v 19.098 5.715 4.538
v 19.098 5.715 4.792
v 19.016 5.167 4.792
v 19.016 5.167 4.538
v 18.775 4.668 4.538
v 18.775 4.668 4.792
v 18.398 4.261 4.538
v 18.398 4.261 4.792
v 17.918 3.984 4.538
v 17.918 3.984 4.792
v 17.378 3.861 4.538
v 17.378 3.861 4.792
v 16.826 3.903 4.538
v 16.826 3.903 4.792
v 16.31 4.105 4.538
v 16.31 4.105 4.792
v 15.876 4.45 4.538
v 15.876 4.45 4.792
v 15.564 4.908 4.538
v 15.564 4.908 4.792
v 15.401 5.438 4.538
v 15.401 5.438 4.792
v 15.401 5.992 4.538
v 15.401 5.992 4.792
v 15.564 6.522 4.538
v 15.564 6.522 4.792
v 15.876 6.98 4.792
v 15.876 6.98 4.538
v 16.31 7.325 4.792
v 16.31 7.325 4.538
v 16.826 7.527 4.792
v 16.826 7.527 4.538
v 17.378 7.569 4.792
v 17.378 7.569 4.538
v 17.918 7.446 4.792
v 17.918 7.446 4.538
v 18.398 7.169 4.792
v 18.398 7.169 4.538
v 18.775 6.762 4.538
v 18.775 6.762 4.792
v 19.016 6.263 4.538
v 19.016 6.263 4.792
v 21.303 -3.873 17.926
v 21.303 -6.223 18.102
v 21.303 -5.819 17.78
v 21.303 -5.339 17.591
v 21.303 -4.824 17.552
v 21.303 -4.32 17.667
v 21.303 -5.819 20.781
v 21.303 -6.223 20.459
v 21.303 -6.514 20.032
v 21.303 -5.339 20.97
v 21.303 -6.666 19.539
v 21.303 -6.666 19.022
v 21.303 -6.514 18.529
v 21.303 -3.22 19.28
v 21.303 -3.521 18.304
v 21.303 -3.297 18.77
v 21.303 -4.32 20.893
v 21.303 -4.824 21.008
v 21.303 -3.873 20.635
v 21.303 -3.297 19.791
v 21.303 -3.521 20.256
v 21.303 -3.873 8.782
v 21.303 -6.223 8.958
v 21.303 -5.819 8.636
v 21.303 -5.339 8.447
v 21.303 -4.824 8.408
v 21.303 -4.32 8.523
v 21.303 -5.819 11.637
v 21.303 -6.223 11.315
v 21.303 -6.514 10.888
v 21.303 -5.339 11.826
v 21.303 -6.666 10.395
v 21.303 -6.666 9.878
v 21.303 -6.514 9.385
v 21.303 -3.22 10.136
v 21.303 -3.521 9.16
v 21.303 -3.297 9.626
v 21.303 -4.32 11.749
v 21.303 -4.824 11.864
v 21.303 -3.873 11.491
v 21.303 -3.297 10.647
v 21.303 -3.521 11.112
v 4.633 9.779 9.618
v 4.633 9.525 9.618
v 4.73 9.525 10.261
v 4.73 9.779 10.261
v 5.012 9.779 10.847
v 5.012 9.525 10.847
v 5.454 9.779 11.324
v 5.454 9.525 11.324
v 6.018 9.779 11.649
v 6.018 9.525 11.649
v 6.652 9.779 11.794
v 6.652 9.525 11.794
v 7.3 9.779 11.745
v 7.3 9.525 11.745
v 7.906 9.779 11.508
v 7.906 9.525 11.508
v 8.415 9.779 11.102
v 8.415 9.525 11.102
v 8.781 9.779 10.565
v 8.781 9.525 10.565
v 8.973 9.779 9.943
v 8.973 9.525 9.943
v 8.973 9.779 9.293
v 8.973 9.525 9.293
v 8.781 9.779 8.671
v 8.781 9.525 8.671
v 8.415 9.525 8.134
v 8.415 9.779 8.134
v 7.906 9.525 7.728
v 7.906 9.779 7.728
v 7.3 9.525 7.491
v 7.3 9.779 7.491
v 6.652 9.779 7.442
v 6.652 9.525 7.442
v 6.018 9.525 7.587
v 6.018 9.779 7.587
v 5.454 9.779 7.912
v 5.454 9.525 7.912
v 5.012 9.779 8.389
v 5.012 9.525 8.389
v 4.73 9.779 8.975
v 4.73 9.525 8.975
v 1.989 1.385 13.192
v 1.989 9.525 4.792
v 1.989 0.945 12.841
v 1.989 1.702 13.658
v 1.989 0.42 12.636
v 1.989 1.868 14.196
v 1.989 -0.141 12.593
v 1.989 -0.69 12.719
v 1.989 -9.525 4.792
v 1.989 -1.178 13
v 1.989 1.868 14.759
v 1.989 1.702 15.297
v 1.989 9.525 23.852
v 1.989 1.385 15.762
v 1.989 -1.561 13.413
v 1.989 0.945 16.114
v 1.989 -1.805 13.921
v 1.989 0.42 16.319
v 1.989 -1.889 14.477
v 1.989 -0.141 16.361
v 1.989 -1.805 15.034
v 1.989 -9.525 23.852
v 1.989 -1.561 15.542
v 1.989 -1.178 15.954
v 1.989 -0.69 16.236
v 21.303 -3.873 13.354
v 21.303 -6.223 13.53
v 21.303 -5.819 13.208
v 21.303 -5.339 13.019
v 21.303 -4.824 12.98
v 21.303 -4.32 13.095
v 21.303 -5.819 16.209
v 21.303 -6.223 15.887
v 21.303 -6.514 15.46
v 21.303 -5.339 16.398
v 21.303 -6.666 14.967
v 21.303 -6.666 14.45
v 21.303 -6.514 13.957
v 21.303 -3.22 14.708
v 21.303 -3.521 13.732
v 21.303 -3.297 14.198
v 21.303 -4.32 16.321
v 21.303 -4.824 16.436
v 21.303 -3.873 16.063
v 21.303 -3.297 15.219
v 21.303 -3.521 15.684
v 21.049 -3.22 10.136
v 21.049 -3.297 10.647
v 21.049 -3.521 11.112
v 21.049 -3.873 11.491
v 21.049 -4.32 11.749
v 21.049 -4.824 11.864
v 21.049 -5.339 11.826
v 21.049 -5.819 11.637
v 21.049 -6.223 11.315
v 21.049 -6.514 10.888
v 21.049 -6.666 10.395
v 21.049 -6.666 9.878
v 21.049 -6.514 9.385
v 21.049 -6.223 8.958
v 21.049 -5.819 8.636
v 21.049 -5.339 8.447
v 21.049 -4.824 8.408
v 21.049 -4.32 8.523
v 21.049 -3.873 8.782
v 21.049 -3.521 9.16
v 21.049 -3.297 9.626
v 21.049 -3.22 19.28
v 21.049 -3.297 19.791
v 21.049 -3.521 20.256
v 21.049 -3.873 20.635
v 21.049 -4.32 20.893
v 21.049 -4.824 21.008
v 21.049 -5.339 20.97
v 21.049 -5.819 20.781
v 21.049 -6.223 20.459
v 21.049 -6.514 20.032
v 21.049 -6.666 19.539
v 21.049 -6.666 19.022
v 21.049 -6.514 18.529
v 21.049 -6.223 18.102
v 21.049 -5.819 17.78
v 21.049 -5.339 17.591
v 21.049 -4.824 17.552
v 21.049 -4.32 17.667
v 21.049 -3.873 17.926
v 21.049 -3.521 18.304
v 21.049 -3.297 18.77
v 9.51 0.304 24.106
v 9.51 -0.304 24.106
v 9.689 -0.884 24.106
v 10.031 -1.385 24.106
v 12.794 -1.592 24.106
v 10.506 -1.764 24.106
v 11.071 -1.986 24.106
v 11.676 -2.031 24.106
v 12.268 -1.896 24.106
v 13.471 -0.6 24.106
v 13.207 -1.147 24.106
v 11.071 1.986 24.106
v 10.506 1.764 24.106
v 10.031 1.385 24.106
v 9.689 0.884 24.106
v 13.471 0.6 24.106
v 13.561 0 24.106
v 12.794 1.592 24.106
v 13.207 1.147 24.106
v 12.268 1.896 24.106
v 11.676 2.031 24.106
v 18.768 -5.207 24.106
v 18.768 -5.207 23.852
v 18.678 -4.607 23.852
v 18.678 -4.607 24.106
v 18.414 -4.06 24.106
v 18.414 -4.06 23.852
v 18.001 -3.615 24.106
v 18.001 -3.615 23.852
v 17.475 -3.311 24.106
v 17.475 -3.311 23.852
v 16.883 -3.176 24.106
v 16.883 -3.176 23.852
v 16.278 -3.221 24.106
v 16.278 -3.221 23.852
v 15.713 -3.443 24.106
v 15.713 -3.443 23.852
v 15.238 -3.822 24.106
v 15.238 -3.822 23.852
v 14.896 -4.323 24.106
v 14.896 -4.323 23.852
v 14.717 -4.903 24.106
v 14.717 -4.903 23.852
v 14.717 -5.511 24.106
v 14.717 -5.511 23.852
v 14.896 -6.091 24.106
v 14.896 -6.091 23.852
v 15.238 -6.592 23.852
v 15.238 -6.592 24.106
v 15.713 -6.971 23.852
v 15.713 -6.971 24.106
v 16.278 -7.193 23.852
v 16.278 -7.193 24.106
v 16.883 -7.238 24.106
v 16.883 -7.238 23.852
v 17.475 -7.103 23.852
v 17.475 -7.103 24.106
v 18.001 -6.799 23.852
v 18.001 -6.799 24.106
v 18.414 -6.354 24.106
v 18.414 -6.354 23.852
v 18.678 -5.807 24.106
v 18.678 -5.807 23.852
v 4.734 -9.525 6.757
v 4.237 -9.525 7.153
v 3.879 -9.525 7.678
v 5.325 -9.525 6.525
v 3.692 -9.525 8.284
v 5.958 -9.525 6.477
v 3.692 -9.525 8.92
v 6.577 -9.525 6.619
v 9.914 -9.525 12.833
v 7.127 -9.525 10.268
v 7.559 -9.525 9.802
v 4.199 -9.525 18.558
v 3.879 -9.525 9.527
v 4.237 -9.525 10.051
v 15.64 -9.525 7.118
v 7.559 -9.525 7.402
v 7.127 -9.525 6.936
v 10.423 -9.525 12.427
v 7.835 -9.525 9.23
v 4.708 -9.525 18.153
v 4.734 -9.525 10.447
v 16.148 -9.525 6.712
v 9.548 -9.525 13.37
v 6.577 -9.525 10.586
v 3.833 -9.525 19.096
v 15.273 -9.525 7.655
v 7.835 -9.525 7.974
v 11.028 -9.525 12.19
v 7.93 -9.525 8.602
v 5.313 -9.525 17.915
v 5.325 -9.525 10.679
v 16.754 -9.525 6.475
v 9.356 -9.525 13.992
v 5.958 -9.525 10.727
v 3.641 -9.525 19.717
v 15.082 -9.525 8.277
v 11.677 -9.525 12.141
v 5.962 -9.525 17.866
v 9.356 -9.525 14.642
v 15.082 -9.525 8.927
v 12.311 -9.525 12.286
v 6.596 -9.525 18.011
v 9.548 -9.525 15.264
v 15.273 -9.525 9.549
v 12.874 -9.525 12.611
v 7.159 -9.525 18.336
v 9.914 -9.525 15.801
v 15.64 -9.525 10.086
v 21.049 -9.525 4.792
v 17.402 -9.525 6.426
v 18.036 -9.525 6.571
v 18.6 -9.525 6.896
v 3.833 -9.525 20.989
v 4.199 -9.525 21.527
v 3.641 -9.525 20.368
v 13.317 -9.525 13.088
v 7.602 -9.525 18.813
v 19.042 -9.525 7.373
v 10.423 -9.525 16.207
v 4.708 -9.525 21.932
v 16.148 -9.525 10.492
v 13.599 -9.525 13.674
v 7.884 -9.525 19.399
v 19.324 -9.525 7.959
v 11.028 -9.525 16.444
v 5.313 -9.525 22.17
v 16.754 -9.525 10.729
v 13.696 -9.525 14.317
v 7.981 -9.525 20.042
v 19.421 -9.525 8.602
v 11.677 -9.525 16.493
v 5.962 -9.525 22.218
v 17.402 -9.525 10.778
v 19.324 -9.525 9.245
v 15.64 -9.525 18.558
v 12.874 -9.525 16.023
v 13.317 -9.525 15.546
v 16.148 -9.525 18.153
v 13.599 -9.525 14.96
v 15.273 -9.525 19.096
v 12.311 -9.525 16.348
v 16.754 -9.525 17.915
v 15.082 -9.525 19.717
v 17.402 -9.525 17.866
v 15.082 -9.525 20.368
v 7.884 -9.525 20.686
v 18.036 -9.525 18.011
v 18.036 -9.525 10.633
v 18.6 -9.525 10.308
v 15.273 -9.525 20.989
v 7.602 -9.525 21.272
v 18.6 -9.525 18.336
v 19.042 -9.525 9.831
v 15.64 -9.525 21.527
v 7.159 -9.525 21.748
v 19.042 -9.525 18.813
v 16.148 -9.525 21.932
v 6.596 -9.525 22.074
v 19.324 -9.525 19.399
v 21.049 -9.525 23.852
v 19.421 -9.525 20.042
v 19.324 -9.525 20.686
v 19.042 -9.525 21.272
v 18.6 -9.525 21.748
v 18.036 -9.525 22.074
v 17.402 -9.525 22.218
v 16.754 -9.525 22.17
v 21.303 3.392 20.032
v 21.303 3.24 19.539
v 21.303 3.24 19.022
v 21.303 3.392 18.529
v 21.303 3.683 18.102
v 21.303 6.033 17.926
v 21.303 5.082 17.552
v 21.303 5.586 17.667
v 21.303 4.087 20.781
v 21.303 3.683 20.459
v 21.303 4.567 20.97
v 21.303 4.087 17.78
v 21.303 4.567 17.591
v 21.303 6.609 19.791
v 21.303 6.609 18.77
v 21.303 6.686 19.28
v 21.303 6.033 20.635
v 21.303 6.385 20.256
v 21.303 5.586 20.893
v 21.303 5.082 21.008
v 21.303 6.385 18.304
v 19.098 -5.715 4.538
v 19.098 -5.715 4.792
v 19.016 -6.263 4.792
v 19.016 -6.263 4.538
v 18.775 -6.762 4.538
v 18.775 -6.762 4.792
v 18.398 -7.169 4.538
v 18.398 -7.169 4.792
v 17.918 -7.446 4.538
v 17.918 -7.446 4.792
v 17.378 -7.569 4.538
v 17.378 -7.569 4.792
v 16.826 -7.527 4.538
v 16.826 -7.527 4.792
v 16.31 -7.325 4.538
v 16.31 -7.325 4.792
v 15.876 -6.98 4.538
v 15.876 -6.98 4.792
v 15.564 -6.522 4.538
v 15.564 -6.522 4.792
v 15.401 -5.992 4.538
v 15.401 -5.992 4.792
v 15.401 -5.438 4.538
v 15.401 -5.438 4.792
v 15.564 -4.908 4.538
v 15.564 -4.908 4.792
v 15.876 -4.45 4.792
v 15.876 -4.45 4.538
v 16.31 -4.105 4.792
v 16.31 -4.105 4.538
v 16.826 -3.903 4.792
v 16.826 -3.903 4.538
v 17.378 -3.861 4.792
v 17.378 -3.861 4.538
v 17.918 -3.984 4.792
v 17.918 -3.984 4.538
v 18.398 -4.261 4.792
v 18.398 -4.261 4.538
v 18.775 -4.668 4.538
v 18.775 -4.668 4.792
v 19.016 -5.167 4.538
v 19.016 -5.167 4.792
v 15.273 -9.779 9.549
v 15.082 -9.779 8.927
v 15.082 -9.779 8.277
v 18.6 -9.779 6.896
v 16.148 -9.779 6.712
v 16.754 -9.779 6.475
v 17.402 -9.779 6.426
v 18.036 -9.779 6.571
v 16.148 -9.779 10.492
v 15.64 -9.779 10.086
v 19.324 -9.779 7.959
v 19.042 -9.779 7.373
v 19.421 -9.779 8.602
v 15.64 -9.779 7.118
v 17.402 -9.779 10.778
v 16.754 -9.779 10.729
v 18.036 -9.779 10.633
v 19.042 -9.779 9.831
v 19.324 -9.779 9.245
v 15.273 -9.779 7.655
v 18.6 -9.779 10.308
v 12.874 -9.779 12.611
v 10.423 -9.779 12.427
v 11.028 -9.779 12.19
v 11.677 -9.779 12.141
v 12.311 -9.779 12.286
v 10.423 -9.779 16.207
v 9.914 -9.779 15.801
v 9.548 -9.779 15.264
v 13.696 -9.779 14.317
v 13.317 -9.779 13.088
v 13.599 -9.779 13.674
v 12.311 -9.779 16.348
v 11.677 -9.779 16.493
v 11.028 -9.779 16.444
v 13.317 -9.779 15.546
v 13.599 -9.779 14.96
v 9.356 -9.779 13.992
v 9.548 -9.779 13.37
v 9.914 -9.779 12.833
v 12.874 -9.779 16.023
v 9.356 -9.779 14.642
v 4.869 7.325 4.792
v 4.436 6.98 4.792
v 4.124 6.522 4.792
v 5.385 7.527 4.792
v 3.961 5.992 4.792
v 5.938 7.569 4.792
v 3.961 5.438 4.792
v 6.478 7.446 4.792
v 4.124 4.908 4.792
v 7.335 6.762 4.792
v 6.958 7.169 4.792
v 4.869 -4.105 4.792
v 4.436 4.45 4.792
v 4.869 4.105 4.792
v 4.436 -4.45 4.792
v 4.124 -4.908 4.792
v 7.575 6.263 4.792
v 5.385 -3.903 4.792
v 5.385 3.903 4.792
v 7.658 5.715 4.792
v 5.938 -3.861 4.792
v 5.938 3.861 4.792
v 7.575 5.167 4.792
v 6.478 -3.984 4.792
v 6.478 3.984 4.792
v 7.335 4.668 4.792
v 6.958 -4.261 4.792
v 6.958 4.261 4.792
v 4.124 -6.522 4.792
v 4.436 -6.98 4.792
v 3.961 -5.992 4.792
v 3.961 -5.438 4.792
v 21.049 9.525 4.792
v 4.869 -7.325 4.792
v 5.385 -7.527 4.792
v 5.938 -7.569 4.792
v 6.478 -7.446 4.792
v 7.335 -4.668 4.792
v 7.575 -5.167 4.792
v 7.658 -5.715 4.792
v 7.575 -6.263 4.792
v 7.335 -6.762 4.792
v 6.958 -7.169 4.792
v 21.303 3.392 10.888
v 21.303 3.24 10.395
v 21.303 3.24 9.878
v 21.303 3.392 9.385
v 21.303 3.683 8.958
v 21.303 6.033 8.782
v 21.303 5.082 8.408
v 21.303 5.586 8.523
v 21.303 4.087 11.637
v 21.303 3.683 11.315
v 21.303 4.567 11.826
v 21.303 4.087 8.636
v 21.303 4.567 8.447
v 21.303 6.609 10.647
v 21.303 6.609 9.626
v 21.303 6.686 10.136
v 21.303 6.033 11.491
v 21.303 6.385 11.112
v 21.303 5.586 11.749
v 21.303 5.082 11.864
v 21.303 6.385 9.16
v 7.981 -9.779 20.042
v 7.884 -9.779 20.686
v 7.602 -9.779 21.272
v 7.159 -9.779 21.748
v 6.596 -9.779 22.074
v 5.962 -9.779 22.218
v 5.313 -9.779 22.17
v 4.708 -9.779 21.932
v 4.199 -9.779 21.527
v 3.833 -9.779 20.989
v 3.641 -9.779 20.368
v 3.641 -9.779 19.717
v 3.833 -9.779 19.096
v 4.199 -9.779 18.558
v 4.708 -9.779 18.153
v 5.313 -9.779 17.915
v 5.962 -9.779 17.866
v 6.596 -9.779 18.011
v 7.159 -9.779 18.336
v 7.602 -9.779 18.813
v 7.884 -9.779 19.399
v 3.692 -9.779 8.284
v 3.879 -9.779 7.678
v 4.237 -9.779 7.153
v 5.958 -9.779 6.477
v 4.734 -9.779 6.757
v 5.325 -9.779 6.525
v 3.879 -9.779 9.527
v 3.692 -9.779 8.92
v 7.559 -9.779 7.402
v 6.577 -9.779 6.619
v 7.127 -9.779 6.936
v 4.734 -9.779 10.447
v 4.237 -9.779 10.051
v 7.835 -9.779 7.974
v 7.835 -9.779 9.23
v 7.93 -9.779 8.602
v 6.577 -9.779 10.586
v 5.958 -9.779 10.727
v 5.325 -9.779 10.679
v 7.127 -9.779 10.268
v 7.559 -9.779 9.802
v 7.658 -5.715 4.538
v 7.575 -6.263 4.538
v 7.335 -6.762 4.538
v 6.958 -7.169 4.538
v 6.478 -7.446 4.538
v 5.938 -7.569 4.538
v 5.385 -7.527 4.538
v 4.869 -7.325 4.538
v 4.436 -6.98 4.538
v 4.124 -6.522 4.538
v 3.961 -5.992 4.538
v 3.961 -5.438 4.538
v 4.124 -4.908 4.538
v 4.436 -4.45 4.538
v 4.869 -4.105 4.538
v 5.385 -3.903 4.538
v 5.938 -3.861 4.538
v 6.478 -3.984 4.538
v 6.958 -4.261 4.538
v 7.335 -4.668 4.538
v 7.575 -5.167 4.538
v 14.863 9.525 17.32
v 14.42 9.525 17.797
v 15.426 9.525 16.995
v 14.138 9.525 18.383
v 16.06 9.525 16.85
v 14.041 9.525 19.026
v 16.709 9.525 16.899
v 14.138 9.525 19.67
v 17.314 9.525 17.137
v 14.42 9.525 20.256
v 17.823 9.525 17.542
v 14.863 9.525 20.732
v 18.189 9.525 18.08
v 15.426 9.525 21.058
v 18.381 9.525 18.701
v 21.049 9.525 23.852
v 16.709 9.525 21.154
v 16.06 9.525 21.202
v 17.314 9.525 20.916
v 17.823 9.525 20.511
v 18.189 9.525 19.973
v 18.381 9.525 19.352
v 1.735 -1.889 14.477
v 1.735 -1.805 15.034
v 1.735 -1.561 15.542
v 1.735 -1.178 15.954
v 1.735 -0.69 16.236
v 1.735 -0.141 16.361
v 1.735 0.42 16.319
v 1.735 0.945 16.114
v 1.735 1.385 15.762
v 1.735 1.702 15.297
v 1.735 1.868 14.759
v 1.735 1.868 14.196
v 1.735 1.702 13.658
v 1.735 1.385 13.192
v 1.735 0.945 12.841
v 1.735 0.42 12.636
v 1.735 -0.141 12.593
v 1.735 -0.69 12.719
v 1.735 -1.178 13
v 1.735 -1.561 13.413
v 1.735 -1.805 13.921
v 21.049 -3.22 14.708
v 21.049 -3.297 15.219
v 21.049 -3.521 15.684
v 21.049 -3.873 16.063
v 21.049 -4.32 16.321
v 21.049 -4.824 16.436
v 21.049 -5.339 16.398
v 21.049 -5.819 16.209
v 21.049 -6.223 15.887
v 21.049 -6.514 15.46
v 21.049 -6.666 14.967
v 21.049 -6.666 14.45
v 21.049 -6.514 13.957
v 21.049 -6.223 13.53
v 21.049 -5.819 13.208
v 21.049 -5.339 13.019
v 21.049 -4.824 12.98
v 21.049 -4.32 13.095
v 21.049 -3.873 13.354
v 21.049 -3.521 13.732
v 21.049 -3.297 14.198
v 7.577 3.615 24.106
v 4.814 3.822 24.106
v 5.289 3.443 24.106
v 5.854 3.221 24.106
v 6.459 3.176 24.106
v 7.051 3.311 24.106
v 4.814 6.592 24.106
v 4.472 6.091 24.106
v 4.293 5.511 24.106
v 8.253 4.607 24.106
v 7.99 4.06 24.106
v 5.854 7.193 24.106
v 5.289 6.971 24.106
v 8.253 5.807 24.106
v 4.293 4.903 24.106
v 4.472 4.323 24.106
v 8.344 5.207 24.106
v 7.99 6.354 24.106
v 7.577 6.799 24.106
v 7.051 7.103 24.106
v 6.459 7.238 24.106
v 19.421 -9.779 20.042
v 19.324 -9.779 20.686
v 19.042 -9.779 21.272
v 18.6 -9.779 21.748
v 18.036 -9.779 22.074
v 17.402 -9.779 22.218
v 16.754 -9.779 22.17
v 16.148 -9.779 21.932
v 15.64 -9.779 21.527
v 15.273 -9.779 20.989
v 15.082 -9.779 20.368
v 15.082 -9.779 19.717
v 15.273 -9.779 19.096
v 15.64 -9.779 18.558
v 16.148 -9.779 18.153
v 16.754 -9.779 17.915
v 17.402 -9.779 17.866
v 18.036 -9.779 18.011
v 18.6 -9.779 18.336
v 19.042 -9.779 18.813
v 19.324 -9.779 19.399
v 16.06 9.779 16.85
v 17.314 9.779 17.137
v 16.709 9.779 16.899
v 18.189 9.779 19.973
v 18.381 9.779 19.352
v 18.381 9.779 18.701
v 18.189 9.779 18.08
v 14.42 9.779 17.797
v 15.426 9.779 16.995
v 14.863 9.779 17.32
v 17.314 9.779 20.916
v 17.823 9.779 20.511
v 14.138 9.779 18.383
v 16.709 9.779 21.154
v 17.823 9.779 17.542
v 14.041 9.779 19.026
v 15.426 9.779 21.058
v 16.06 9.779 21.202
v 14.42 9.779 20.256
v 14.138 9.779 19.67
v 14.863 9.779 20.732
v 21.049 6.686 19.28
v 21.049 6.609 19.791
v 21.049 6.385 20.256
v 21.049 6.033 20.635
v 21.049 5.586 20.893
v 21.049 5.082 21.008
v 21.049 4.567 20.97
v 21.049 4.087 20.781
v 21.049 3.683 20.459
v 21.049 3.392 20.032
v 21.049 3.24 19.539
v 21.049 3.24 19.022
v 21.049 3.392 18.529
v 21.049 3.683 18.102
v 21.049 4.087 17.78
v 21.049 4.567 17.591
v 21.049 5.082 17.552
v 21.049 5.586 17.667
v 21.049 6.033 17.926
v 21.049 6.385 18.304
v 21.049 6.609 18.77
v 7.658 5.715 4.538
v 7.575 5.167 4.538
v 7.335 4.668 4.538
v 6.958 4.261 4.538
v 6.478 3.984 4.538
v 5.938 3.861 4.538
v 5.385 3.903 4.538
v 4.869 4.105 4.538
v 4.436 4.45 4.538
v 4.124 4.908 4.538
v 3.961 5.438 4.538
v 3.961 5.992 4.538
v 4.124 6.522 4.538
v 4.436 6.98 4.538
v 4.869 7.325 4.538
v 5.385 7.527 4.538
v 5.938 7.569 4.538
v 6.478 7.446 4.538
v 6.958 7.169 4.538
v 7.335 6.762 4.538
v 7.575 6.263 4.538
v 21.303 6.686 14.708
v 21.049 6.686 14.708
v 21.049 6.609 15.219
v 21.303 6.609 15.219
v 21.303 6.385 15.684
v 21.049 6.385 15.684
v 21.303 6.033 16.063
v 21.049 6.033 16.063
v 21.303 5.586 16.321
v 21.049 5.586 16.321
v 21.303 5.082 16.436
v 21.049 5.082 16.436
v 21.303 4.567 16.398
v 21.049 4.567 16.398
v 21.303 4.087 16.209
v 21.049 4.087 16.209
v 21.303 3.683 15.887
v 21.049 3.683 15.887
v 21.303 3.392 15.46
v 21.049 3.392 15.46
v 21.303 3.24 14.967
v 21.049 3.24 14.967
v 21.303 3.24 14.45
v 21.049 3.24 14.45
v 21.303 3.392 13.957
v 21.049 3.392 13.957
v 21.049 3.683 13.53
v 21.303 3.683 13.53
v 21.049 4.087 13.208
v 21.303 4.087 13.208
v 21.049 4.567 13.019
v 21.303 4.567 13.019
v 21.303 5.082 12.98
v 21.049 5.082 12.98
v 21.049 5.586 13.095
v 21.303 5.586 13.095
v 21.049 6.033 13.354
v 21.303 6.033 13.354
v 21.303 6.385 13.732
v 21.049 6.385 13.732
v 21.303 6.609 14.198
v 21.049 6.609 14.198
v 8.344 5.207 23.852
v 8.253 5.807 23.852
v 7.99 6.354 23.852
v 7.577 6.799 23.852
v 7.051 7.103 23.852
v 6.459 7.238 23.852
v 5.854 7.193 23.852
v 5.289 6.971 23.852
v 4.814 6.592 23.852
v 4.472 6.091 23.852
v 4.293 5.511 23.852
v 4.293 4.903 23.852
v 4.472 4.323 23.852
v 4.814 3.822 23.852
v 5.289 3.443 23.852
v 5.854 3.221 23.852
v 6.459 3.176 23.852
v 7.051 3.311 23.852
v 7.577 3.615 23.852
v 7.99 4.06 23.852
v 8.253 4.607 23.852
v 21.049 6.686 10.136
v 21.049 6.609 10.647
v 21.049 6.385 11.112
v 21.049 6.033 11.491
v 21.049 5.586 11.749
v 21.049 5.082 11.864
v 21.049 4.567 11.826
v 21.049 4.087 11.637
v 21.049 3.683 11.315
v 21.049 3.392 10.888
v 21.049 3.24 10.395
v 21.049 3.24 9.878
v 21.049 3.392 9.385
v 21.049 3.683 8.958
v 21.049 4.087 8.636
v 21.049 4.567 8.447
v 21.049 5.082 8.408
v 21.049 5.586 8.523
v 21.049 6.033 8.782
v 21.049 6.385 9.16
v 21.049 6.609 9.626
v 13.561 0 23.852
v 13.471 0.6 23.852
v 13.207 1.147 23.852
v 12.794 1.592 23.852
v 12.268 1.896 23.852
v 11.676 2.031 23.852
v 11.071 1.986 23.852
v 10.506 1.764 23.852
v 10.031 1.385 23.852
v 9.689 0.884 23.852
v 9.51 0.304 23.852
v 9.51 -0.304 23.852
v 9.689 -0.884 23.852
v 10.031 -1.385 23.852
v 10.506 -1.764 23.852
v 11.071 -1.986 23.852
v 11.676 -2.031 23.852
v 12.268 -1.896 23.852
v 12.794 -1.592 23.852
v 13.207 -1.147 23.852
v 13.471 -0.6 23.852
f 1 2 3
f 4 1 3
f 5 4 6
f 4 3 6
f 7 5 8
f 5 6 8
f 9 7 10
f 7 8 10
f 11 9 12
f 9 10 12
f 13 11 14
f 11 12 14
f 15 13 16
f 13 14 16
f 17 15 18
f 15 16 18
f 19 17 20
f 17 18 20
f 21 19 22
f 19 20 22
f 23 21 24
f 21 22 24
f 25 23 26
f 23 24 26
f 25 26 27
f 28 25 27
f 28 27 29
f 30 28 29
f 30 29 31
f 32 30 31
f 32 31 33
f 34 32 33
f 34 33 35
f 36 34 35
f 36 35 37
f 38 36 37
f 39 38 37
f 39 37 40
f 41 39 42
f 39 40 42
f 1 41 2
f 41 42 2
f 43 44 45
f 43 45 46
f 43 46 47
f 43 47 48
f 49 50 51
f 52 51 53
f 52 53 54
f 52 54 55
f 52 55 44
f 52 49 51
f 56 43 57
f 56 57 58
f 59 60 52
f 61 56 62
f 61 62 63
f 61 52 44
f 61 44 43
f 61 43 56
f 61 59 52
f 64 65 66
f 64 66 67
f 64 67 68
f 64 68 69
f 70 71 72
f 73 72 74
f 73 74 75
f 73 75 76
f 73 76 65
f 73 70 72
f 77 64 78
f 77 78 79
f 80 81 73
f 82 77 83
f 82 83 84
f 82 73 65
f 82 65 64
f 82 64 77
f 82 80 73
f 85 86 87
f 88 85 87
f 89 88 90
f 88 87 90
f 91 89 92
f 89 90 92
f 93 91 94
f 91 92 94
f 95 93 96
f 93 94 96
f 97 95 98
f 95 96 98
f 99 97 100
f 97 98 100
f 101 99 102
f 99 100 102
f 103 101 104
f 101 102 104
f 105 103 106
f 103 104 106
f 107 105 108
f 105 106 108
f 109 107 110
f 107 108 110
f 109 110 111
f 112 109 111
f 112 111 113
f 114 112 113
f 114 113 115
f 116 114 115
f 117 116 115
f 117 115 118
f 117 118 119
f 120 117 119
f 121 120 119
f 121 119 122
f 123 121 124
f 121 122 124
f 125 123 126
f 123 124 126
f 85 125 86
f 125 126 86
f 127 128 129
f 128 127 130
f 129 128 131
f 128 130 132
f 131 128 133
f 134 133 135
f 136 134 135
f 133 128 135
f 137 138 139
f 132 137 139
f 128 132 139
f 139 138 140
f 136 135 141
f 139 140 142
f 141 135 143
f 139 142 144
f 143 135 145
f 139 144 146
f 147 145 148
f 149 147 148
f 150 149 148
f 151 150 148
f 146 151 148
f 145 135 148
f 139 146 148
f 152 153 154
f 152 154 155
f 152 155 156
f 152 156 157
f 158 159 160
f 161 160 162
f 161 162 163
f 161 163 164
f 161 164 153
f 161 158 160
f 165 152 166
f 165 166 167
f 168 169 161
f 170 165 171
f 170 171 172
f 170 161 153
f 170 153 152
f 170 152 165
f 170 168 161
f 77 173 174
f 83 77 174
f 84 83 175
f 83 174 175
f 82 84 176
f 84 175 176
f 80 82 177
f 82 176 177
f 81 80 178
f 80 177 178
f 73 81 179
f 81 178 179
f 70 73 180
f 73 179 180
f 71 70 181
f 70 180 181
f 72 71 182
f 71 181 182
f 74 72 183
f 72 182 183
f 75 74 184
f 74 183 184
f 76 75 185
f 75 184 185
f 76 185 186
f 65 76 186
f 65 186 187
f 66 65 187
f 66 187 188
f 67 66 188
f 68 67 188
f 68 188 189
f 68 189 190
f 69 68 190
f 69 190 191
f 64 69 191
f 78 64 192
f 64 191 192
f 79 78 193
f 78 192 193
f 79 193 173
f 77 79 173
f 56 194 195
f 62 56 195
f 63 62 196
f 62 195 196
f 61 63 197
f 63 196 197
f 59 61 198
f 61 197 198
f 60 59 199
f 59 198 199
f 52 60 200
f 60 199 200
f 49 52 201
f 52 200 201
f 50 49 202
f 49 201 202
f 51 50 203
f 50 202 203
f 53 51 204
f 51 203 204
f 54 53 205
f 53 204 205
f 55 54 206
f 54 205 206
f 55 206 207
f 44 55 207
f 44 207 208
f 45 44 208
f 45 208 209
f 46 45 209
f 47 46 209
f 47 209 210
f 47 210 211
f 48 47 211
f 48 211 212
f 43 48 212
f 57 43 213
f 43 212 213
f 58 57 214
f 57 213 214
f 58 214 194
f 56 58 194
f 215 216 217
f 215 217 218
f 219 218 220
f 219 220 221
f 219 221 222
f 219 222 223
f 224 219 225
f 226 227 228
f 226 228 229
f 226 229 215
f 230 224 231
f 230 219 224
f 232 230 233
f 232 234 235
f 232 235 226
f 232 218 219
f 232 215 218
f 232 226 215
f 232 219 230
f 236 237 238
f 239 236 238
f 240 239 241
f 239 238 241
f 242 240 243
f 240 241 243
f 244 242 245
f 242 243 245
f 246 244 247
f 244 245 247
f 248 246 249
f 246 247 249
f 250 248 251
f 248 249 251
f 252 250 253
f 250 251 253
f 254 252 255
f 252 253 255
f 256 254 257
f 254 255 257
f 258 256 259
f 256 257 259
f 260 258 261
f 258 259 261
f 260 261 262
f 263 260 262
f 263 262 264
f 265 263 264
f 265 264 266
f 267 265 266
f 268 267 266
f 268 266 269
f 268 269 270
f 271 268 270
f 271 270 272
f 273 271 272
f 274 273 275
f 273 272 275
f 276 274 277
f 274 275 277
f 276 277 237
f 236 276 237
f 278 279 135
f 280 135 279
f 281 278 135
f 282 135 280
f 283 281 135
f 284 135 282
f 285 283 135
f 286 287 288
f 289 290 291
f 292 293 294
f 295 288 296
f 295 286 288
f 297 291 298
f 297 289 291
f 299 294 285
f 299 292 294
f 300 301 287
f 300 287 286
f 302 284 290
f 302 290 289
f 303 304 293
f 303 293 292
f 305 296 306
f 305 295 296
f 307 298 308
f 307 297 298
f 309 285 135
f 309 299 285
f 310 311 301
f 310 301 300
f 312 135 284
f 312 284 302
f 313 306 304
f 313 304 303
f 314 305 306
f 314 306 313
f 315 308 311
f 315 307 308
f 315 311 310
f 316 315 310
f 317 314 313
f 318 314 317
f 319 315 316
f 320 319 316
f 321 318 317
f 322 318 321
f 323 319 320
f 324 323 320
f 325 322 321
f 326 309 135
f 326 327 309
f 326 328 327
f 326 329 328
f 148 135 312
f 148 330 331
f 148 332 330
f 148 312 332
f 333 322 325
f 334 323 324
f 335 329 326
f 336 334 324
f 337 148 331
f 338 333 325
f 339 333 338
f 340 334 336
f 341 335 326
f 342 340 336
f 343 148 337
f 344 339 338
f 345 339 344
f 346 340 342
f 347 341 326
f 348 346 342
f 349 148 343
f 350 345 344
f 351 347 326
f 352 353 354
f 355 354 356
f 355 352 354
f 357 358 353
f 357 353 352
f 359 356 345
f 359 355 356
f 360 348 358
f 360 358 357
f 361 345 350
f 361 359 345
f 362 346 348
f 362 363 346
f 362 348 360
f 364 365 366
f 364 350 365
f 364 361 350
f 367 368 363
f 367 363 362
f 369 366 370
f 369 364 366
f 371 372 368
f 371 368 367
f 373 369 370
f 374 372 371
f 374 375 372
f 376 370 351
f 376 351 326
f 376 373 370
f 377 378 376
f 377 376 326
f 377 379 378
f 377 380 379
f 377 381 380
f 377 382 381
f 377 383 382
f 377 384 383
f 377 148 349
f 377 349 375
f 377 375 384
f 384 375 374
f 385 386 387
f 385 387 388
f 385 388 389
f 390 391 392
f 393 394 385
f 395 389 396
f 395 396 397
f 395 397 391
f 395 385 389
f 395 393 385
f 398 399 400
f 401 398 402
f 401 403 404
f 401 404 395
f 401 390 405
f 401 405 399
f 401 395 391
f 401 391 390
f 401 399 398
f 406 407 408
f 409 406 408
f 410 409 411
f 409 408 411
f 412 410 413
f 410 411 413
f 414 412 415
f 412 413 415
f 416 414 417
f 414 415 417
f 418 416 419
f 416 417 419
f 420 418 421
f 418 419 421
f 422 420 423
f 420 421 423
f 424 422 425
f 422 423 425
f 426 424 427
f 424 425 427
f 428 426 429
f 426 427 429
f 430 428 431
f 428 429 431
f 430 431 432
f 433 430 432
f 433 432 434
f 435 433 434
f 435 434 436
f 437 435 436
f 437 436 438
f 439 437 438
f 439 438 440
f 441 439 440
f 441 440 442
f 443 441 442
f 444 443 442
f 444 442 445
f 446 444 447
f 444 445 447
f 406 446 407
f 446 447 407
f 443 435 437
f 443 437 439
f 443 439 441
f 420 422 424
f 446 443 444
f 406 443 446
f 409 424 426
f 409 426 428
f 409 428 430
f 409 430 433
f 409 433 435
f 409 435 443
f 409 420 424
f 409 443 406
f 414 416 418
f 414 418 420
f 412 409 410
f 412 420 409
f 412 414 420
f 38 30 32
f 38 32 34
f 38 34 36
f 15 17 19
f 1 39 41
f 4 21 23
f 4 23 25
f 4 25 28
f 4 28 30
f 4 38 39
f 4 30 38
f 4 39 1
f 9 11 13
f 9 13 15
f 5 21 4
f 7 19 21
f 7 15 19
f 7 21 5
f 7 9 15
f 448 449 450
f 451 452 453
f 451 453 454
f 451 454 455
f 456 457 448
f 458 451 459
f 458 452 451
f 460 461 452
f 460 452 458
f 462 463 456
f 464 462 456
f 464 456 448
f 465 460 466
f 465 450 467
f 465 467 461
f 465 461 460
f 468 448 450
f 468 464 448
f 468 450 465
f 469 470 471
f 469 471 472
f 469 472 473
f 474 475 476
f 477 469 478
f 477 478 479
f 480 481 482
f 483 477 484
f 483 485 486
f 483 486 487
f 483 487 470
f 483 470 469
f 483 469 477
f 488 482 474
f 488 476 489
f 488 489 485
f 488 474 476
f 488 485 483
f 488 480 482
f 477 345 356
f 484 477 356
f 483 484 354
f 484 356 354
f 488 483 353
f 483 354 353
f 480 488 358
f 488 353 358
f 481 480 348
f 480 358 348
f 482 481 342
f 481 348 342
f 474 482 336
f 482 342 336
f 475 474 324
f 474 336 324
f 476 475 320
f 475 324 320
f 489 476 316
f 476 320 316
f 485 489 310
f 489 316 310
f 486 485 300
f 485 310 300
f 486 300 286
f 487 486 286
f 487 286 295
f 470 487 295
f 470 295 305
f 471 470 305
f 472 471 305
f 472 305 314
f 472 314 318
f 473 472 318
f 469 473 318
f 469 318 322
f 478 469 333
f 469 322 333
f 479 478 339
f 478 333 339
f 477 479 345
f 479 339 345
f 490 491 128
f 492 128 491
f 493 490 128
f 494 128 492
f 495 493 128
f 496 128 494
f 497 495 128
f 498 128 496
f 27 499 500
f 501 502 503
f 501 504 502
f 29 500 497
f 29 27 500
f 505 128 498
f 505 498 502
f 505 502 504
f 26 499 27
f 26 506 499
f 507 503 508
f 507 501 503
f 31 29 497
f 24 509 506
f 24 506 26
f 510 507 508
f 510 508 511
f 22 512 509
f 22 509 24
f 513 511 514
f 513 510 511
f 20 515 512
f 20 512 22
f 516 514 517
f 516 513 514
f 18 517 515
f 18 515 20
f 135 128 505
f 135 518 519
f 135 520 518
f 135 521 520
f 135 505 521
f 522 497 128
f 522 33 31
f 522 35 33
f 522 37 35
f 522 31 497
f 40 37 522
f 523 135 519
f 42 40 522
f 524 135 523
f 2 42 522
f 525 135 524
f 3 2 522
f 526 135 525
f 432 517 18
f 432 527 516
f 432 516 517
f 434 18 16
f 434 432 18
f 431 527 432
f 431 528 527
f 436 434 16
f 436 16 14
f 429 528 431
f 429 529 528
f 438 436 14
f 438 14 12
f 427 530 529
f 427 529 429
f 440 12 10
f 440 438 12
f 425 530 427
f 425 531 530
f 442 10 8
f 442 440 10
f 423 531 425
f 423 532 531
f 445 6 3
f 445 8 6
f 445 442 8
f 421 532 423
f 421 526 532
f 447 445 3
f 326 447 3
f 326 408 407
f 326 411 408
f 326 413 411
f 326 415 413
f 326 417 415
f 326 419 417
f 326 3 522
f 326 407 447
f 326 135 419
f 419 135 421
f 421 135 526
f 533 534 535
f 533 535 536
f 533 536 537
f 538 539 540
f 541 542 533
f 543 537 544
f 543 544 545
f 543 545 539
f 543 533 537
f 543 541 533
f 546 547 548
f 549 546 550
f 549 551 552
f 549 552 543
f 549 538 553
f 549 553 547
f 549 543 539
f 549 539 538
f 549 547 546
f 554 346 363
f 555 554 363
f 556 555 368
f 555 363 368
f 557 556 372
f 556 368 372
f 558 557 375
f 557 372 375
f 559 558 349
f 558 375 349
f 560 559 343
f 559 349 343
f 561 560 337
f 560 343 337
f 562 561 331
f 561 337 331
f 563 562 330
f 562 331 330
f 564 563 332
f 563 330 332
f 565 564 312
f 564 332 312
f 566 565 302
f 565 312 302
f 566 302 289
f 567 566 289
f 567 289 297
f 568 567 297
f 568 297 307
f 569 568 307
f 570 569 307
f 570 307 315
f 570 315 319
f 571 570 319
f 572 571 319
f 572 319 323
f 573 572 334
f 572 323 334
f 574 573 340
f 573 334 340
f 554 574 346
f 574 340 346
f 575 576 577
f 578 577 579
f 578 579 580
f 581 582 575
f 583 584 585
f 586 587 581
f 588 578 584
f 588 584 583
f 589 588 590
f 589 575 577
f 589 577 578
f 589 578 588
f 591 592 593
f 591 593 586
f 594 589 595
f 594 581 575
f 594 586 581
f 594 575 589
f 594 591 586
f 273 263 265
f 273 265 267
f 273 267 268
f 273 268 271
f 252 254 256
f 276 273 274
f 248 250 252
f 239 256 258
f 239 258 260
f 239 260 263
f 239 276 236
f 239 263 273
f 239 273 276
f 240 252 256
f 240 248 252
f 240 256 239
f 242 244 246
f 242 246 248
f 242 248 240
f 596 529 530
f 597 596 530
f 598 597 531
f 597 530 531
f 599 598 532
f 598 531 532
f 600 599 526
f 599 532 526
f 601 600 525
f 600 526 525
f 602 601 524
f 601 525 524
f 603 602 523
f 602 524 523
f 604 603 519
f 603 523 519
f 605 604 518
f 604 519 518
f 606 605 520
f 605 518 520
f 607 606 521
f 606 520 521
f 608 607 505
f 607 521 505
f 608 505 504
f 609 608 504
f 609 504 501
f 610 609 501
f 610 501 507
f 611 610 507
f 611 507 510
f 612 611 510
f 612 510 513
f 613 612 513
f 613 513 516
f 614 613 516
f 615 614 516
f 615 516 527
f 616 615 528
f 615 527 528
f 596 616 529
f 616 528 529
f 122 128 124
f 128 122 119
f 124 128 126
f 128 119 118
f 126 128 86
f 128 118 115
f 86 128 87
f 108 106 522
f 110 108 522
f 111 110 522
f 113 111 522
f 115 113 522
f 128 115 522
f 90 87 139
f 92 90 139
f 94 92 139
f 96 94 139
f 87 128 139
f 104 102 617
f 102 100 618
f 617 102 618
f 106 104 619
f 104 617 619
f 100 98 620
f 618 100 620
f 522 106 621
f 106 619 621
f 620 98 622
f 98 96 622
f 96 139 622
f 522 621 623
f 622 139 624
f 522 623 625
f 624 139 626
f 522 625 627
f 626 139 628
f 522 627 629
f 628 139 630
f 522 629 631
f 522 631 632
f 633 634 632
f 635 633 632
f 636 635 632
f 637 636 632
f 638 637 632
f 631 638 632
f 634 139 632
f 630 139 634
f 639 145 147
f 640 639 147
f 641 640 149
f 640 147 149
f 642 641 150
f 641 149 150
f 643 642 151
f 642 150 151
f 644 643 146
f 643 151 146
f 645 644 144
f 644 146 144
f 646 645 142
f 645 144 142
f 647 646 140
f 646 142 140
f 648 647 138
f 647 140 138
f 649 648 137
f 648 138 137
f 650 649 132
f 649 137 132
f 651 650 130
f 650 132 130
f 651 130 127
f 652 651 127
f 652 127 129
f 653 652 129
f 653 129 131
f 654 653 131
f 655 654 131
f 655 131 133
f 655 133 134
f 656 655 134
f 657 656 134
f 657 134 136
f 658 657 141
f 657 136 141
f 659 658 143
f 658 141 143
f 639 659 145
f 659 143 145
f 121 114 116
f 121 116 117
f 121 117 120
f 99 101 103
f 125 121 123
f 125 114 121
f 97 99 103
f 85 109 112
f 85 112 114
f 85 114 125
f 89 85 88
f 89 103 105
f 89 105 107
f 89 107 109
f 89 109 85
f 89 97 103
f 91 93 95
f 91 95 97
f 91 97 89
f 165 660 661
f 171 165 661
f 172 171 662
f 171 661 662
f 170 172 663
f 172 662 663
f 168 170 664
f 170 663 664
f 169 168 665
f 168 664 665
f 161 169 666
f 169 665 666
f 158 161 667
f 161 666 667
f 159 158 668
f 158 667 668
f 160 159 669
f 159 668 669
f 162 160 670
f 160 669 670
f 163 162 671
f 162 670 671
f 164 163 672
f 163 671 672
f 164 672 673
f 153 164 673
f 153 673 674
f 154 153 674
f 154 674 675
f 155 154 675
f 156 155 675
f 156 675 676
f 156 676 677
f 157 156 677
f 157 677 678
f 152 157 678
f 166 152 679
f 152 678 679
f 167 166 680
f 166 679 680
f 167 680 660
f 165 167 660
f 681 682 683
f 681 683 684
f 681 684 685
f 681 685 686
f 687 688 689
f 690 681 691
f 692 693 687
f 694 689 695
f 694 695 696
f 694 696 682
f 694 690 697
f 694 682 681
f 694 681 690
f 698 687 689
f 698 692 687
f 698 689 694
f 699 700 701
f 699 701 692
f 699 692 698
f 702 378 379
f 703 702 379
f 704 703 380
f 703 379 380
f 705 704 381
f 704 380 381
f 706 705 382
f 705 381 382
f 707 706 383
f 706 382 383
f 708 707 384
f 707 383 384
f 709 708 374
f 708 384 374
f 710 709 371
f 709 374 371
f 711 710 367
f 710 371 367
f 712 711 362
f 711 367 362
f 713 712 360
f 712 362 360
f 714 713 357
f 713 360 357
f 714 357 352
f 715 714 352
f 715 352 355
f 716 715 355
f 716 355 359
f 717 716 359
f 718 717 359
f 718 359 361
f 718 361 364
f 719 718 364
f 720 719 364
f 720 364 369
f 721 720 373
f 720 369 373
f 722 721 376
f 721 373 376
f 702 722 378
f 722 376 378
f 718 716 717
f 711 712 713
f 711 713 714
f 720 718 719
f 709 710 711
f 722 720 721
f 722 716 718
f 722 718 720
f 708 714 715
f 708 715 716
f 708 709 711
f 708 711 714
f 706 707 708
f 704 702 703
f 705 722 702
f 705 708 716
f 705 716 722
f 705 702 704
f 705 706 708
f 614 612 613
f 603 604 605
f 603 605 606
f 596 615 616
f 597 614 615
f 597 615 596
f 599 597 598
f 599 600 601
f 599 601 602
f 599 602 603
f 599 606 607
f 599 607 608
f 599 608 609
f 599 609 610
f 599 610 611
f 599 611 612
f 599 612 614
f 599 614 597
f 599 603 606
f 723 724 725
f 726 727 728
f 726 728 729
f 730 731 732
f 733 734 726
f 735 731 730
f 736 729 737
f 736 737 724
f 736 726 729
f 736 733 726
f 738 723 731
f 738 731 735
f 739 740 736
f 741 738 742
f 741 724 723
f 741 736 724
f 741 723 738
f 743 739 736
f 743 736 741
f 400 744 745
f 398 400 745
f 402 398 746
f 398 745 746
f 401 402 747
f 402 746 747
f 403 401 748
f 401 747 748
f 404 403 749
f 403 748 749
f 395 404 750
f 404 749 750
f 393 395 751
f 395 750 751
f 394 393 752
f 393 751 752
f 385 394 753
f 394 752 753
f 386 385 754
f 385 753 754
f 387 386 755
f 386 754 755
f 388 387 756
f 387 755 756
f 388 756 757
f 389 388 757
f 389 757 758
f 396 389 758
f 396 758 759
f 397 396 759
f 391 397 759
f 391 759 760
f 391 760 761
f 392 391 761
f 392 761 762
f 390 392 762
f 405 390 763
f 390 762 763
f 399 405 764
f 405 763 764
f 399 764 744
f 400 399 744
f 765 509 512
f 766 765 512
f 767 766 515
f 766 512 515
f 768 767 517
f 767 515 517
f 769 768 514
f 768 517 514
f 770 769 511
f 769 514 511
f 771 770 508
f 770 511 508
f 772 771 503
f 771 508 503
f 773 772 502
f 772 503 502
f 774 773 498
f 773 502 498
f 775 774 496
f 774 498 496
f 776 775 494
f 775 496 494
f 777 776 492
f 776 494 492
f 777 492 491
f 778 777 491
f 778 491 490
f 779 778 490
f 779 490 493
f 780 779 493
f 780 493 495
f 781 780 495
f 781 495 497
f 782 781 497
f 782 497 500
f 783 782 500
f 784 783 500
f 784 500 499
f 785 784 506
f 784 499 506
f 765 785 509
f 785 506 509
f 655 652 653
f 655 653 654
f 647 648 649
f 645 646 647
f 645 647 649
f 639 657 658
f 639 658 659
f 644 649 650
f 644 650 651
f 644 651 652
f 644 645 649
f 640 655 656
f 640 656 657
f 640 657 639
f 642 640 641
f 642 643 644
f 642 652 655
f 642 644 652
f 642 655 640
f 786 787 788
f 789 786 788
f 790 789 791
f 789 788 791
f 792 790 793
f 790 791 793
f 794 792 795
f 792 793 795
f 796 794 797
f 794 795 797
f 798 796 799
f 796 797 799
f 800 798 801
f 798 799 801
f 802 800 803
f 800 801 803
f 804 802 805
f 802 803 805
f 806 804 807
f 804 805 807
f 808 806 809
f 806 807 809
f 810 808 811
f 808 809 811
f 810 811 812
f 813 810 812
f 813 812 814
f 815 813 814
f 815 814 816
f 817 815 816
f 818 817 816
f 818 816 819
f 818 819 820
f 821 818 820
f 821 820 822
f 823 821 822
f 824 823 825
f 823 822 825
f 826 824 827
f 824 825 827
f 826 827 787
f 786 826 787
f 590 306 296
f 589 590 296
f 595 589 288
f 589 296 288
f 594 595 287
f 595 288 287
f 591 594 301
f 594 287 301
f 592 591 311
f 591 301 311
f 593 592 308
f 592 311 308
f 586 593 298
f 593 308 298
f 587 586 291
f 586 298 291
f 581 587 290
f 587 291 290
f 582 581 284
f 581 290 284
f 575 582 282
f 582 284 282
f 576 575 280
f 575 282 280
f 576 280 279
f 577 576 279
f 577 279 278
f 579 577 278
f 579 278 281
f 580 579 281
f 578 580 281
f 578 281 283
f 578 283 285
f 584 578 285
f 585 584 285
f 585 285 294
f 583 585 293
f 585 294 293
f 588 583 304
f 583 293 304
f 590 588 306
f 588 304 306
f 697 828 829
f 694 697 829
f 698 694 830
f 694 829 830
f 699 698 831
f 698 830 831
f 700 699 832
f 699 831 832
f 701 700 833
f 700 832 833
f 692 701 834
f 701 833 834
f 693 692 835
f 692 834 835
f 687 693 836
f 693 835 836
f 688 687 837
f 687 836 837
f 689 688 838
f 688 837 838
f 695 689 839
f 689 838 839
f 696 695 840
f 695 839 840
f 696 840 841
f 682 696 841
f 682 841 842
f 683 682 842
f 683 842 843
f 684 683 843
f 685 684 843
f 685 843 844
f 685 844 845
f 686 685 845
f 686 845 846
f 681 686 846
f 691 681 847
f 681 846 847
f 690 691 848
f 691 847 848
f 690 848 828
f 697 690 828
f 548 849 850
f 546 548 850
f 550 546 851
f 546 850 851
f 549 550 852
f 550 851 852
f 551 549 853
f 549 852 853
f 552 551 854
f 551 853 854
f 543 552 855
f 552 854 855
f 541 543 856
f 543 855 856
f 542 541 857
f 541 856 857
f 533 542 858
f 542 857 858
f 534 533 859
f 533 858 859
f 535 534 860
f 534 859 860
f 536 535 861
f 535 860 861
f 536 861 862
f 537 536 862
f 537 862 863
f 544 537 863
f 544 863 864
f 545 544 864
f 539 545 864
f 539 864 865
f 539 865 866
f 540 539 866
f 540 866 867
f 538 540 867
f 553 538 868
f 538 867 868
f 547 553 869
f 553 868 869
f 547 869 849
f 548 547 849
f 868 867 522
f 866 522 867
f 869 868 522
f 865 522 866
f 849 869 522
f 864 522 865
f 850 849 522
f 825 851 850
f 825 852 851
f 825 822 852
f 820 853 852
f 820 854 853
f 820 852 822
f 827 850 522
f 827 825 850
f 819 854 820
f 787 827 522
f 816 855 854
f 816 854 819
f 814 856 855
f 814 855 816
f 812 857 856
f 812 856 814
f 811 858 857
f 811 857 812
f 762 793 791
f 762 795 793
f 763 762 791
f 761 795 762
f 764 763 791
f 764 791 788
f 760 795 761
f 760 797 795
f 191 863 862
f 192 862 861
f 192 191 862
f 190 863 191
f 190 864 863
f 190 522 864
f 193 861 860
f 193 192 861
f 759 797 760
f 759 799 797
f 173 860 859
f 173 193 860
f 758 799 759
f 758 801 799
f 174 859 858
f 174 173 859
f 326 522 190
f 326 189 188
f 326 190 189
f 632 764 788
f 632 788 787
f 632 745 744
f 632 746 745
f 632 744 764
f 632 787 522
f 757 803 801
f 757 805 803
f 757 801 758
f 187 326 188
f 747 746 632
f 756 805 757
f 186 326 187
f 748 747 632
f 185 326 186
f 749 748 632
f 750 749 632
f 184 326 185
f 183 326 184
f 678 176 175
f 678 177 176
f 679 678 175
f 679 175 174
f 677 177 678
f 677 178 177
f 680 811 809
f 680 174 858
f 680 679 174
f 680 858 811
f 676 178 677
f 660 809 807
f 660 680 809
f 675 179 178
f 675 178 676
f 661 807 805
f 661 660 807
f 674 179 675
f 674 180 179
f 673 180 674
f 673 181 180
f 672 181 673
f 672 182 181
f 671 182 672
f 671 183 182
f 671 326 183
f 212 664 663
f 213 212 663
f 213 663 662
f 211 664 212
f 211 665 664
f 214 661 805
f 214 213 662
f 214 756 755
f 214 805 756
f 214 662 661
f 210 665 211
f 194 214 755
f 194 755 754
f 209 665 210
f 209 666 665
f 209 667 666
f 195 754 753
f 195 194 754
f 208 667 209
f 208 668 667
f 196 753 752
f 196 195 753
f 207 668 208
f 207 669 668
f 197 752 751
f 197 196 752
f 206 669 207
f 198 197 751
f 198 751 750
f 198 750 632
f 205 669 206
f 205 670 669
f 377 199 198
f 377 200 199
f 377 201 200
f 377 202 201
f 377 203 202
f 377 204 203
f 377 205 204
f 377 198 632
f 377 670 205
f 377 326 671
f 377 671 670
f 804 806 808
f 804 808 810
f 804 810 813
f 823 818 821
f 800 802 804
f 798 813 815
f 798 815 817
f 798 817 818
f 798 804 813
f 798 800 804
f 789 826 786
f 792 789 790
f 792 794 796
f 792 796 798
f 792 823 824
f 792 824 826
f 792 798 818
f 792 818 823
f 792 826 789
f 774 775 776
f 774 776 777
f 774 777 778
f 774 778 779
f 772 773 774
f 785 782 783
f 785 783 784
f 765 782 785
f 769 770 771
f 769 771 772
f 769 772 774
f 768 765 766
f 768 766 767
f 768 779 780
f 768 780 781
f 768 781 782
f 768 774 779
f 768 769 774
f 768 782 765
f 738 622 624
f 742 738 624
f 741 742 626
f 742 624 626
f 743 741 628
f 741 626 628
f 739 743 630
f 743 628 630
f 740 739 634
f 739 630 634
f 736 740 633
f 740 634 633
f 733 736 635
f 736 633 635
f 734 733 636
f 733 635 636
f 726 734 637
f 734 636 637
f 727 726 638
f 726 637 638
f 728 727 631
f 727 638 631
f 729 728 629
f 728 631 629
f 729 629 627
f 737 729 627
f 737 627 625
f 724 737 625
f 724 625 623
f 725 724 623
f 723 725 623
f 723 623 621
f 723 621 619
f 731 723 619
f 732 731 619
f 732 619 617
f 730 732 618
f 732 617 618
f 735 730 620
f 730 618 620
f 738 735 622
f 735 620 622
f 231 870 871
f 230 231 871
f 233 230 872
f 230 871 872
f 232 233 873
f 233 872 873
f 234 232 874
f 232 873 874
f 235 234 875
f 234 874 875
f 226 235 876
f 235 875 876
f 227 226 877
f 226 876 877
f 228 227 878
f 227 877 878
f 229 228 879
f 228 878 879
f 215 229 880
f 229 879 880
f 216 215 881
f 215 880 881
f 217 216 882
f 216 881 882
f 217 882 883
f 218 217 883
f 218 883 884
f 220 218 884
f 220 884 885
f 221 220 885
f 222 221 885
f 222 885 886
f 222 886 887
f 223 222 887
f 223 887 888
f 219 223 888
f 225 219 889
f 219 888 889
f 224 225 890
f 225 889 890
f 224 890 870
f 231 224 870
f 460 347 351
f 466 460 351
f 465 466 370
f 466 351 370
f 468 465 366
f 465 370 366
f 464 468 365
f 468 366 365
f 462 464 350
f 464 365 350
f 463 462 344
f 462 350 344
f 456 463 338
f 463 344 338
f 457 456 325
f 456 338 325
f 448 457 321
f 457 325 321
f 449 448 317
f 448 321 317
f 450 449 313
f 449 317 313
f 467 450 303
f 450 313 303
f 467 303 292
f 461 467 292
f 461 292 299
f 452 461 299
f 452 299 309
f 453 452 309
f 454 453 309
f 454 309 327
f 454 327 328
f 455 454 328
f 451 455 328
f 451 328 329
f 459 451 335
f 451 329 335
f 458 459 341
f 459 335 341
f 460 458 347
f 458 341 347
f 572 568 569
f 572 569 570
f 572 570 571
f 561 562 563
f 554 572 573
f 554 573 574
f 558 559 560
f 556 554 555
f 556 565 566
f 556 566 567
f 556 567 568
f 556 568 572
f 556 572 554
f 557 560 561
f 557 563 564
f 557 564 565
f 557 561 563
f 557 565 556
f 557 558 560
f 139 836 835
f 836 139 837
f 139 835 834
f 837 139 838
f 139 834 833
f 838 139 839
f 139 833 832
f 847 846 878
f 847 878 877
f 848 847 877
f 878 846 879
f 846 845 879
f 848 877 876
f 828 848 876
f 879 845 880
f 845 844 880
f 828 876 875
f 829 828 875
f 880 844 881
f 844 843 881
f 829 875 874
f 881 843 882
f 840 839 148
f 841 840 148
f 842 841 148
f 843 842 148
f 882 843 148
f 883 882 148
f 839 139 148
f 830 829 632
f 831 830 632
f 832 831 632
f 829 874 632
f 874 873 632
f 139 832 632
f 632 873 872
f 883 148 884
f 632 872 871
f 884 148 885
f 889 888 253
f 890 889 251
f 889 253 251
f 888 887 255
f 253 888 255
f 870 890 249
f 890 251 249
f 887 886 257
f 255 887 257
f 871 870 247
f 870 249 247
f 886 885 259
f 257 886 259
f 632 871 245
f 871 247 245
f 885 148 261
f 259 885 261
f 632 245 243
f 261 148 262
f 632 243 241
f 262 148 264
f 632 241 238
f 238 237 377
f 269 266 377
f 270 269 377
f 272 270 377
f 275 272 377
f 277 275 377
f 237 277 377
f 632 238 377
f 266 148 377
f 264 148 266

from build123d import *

# Parameters (mm, degrees)
F0_W      = 19.06034071
F0_H      = 19.06034071
F1_DEPTH  = 9.525
F2_R      = 1.8892312699
F8_DEPTH  = 0.254
F3_R      = 1.7327827713
F9_DEPTH  = 0.254
F4_R      = 2.1821211745
F10_DEPTH = 0.254
F5_R      = 2.0368058648
F11_DEPTH = 0.254
F6_R      = 1.8590976902
F12_DEPTH = 0.254
F7_R      = 2.1308019233
F7_R_2    = 2.1821211745
F13_DEPTH = 0.254


with BuildPart() as f1:
    # F0 (on Front) → F1 (new body, symmetric)
    with BuildSketch(Plane.XZ):
        with Locations((11.5190818906, 14.3221947365)):
            Rectangle(F0_W, F0_H)
    extrude(amount=F1_DEPTH, both=True)

    # F2 (on face) → F8 (join)
    with BuildSketch(Plane(origin=(1.9889115356, 0, 0), x_dir=(0, -1, 0), z_dir=(-1, 0, 0))):
        with Locations((0, 14.4774196669)):
            Circle(F2_R)
    extrude(amount=F8_DEPTH)

    # F3 (on face) → F9 (join)
    with BuildSketch(Plane.YZ.offset(21.0492522456)):
        with Locations((-4.953, 19.2803650914)):
            Circle(F3_R)
        with Locations((4.953, 19.2803650914)):
            Circle(F3_R)
        with Locations((4.953, 10.1363650914)):
            Circle(F3_R)
        with Locations((-4.953, 10.1363650914)):
            Circle(F3_R)
        with Locations((-4.953, 14.7083650914)):
            Circle(F3_R)
        with Locations((4.953, 14.7083650914)):
            Circle(F3_R)
    extrude(amount=F9_DEPTH)

    # F4 (on face) → F10 (join)
    with BuildSketch(Plane(origin=(0, 9.525, 0), x_dir=(-1, 0, 0), z_dir=(0, 1, 0))):
        with Locations((-16.2232522456, 19.0263650914)):
            Circle(F4_R)
        with Locations((-6.8149115356, 9.6180243815)):
            Circle(F4_R)
    extrude(amount=F10_DEPTH)

    # F5 (on face) → F11 (join)
    with BuildSketch(Plane.XY.offset(23.8523650914)):
        with Locations((16.7312522456, -5.207)):
            Circle(F5_R)
        with Locations((11.5242522456, 0)):
            Circle(F5_R)
        with Locations((6.3069115356, 5.207)):
            Circle(F5_R)
    extrude(amount=F11_DEPTH)

    # F6 (on face) → F12 (join)
    with BuildSketch(Plane(origin=(0, 0, 4.7920243815), x_dir=(1, 0, 0), z_dir=(0, 0, -1))):
        with Locations((5.7989115356, 5.715)):
            Circle(F6_R)
        with Locations((17.2392522456, 5.715)):
            Circle(F6_R)
        with Locations((5.7989115356, -5.715)):
            Circle(F6_R)
        with Locations((17.2392522456, -5.715)):
            Circle(F6_R)
    extrude(amount=F12_DEPTH)

    # F7 (on face) → F13 (join)
    with BuildSketch(Plane.XZ.offset(9.525)):
        with Locations((5.7989115356, 8.6020243815)):
            Circle(F7_R)
        with Locations((17.2392522456, 20.0423650914)):
            Circle(F7_R_2)
        with Locations((5.7989115356, 20.0423650914)):
            Circle(F7_R_2)
        with Locations((17.2392522456, 8.6020243815)):
            Circle(F7_R_2)
        with Locations((11.5139115356, 14.3170229782)):
            Circle(F7_R_2)
    extrude(amount=F13_DEPTH)


solid = f1.part
